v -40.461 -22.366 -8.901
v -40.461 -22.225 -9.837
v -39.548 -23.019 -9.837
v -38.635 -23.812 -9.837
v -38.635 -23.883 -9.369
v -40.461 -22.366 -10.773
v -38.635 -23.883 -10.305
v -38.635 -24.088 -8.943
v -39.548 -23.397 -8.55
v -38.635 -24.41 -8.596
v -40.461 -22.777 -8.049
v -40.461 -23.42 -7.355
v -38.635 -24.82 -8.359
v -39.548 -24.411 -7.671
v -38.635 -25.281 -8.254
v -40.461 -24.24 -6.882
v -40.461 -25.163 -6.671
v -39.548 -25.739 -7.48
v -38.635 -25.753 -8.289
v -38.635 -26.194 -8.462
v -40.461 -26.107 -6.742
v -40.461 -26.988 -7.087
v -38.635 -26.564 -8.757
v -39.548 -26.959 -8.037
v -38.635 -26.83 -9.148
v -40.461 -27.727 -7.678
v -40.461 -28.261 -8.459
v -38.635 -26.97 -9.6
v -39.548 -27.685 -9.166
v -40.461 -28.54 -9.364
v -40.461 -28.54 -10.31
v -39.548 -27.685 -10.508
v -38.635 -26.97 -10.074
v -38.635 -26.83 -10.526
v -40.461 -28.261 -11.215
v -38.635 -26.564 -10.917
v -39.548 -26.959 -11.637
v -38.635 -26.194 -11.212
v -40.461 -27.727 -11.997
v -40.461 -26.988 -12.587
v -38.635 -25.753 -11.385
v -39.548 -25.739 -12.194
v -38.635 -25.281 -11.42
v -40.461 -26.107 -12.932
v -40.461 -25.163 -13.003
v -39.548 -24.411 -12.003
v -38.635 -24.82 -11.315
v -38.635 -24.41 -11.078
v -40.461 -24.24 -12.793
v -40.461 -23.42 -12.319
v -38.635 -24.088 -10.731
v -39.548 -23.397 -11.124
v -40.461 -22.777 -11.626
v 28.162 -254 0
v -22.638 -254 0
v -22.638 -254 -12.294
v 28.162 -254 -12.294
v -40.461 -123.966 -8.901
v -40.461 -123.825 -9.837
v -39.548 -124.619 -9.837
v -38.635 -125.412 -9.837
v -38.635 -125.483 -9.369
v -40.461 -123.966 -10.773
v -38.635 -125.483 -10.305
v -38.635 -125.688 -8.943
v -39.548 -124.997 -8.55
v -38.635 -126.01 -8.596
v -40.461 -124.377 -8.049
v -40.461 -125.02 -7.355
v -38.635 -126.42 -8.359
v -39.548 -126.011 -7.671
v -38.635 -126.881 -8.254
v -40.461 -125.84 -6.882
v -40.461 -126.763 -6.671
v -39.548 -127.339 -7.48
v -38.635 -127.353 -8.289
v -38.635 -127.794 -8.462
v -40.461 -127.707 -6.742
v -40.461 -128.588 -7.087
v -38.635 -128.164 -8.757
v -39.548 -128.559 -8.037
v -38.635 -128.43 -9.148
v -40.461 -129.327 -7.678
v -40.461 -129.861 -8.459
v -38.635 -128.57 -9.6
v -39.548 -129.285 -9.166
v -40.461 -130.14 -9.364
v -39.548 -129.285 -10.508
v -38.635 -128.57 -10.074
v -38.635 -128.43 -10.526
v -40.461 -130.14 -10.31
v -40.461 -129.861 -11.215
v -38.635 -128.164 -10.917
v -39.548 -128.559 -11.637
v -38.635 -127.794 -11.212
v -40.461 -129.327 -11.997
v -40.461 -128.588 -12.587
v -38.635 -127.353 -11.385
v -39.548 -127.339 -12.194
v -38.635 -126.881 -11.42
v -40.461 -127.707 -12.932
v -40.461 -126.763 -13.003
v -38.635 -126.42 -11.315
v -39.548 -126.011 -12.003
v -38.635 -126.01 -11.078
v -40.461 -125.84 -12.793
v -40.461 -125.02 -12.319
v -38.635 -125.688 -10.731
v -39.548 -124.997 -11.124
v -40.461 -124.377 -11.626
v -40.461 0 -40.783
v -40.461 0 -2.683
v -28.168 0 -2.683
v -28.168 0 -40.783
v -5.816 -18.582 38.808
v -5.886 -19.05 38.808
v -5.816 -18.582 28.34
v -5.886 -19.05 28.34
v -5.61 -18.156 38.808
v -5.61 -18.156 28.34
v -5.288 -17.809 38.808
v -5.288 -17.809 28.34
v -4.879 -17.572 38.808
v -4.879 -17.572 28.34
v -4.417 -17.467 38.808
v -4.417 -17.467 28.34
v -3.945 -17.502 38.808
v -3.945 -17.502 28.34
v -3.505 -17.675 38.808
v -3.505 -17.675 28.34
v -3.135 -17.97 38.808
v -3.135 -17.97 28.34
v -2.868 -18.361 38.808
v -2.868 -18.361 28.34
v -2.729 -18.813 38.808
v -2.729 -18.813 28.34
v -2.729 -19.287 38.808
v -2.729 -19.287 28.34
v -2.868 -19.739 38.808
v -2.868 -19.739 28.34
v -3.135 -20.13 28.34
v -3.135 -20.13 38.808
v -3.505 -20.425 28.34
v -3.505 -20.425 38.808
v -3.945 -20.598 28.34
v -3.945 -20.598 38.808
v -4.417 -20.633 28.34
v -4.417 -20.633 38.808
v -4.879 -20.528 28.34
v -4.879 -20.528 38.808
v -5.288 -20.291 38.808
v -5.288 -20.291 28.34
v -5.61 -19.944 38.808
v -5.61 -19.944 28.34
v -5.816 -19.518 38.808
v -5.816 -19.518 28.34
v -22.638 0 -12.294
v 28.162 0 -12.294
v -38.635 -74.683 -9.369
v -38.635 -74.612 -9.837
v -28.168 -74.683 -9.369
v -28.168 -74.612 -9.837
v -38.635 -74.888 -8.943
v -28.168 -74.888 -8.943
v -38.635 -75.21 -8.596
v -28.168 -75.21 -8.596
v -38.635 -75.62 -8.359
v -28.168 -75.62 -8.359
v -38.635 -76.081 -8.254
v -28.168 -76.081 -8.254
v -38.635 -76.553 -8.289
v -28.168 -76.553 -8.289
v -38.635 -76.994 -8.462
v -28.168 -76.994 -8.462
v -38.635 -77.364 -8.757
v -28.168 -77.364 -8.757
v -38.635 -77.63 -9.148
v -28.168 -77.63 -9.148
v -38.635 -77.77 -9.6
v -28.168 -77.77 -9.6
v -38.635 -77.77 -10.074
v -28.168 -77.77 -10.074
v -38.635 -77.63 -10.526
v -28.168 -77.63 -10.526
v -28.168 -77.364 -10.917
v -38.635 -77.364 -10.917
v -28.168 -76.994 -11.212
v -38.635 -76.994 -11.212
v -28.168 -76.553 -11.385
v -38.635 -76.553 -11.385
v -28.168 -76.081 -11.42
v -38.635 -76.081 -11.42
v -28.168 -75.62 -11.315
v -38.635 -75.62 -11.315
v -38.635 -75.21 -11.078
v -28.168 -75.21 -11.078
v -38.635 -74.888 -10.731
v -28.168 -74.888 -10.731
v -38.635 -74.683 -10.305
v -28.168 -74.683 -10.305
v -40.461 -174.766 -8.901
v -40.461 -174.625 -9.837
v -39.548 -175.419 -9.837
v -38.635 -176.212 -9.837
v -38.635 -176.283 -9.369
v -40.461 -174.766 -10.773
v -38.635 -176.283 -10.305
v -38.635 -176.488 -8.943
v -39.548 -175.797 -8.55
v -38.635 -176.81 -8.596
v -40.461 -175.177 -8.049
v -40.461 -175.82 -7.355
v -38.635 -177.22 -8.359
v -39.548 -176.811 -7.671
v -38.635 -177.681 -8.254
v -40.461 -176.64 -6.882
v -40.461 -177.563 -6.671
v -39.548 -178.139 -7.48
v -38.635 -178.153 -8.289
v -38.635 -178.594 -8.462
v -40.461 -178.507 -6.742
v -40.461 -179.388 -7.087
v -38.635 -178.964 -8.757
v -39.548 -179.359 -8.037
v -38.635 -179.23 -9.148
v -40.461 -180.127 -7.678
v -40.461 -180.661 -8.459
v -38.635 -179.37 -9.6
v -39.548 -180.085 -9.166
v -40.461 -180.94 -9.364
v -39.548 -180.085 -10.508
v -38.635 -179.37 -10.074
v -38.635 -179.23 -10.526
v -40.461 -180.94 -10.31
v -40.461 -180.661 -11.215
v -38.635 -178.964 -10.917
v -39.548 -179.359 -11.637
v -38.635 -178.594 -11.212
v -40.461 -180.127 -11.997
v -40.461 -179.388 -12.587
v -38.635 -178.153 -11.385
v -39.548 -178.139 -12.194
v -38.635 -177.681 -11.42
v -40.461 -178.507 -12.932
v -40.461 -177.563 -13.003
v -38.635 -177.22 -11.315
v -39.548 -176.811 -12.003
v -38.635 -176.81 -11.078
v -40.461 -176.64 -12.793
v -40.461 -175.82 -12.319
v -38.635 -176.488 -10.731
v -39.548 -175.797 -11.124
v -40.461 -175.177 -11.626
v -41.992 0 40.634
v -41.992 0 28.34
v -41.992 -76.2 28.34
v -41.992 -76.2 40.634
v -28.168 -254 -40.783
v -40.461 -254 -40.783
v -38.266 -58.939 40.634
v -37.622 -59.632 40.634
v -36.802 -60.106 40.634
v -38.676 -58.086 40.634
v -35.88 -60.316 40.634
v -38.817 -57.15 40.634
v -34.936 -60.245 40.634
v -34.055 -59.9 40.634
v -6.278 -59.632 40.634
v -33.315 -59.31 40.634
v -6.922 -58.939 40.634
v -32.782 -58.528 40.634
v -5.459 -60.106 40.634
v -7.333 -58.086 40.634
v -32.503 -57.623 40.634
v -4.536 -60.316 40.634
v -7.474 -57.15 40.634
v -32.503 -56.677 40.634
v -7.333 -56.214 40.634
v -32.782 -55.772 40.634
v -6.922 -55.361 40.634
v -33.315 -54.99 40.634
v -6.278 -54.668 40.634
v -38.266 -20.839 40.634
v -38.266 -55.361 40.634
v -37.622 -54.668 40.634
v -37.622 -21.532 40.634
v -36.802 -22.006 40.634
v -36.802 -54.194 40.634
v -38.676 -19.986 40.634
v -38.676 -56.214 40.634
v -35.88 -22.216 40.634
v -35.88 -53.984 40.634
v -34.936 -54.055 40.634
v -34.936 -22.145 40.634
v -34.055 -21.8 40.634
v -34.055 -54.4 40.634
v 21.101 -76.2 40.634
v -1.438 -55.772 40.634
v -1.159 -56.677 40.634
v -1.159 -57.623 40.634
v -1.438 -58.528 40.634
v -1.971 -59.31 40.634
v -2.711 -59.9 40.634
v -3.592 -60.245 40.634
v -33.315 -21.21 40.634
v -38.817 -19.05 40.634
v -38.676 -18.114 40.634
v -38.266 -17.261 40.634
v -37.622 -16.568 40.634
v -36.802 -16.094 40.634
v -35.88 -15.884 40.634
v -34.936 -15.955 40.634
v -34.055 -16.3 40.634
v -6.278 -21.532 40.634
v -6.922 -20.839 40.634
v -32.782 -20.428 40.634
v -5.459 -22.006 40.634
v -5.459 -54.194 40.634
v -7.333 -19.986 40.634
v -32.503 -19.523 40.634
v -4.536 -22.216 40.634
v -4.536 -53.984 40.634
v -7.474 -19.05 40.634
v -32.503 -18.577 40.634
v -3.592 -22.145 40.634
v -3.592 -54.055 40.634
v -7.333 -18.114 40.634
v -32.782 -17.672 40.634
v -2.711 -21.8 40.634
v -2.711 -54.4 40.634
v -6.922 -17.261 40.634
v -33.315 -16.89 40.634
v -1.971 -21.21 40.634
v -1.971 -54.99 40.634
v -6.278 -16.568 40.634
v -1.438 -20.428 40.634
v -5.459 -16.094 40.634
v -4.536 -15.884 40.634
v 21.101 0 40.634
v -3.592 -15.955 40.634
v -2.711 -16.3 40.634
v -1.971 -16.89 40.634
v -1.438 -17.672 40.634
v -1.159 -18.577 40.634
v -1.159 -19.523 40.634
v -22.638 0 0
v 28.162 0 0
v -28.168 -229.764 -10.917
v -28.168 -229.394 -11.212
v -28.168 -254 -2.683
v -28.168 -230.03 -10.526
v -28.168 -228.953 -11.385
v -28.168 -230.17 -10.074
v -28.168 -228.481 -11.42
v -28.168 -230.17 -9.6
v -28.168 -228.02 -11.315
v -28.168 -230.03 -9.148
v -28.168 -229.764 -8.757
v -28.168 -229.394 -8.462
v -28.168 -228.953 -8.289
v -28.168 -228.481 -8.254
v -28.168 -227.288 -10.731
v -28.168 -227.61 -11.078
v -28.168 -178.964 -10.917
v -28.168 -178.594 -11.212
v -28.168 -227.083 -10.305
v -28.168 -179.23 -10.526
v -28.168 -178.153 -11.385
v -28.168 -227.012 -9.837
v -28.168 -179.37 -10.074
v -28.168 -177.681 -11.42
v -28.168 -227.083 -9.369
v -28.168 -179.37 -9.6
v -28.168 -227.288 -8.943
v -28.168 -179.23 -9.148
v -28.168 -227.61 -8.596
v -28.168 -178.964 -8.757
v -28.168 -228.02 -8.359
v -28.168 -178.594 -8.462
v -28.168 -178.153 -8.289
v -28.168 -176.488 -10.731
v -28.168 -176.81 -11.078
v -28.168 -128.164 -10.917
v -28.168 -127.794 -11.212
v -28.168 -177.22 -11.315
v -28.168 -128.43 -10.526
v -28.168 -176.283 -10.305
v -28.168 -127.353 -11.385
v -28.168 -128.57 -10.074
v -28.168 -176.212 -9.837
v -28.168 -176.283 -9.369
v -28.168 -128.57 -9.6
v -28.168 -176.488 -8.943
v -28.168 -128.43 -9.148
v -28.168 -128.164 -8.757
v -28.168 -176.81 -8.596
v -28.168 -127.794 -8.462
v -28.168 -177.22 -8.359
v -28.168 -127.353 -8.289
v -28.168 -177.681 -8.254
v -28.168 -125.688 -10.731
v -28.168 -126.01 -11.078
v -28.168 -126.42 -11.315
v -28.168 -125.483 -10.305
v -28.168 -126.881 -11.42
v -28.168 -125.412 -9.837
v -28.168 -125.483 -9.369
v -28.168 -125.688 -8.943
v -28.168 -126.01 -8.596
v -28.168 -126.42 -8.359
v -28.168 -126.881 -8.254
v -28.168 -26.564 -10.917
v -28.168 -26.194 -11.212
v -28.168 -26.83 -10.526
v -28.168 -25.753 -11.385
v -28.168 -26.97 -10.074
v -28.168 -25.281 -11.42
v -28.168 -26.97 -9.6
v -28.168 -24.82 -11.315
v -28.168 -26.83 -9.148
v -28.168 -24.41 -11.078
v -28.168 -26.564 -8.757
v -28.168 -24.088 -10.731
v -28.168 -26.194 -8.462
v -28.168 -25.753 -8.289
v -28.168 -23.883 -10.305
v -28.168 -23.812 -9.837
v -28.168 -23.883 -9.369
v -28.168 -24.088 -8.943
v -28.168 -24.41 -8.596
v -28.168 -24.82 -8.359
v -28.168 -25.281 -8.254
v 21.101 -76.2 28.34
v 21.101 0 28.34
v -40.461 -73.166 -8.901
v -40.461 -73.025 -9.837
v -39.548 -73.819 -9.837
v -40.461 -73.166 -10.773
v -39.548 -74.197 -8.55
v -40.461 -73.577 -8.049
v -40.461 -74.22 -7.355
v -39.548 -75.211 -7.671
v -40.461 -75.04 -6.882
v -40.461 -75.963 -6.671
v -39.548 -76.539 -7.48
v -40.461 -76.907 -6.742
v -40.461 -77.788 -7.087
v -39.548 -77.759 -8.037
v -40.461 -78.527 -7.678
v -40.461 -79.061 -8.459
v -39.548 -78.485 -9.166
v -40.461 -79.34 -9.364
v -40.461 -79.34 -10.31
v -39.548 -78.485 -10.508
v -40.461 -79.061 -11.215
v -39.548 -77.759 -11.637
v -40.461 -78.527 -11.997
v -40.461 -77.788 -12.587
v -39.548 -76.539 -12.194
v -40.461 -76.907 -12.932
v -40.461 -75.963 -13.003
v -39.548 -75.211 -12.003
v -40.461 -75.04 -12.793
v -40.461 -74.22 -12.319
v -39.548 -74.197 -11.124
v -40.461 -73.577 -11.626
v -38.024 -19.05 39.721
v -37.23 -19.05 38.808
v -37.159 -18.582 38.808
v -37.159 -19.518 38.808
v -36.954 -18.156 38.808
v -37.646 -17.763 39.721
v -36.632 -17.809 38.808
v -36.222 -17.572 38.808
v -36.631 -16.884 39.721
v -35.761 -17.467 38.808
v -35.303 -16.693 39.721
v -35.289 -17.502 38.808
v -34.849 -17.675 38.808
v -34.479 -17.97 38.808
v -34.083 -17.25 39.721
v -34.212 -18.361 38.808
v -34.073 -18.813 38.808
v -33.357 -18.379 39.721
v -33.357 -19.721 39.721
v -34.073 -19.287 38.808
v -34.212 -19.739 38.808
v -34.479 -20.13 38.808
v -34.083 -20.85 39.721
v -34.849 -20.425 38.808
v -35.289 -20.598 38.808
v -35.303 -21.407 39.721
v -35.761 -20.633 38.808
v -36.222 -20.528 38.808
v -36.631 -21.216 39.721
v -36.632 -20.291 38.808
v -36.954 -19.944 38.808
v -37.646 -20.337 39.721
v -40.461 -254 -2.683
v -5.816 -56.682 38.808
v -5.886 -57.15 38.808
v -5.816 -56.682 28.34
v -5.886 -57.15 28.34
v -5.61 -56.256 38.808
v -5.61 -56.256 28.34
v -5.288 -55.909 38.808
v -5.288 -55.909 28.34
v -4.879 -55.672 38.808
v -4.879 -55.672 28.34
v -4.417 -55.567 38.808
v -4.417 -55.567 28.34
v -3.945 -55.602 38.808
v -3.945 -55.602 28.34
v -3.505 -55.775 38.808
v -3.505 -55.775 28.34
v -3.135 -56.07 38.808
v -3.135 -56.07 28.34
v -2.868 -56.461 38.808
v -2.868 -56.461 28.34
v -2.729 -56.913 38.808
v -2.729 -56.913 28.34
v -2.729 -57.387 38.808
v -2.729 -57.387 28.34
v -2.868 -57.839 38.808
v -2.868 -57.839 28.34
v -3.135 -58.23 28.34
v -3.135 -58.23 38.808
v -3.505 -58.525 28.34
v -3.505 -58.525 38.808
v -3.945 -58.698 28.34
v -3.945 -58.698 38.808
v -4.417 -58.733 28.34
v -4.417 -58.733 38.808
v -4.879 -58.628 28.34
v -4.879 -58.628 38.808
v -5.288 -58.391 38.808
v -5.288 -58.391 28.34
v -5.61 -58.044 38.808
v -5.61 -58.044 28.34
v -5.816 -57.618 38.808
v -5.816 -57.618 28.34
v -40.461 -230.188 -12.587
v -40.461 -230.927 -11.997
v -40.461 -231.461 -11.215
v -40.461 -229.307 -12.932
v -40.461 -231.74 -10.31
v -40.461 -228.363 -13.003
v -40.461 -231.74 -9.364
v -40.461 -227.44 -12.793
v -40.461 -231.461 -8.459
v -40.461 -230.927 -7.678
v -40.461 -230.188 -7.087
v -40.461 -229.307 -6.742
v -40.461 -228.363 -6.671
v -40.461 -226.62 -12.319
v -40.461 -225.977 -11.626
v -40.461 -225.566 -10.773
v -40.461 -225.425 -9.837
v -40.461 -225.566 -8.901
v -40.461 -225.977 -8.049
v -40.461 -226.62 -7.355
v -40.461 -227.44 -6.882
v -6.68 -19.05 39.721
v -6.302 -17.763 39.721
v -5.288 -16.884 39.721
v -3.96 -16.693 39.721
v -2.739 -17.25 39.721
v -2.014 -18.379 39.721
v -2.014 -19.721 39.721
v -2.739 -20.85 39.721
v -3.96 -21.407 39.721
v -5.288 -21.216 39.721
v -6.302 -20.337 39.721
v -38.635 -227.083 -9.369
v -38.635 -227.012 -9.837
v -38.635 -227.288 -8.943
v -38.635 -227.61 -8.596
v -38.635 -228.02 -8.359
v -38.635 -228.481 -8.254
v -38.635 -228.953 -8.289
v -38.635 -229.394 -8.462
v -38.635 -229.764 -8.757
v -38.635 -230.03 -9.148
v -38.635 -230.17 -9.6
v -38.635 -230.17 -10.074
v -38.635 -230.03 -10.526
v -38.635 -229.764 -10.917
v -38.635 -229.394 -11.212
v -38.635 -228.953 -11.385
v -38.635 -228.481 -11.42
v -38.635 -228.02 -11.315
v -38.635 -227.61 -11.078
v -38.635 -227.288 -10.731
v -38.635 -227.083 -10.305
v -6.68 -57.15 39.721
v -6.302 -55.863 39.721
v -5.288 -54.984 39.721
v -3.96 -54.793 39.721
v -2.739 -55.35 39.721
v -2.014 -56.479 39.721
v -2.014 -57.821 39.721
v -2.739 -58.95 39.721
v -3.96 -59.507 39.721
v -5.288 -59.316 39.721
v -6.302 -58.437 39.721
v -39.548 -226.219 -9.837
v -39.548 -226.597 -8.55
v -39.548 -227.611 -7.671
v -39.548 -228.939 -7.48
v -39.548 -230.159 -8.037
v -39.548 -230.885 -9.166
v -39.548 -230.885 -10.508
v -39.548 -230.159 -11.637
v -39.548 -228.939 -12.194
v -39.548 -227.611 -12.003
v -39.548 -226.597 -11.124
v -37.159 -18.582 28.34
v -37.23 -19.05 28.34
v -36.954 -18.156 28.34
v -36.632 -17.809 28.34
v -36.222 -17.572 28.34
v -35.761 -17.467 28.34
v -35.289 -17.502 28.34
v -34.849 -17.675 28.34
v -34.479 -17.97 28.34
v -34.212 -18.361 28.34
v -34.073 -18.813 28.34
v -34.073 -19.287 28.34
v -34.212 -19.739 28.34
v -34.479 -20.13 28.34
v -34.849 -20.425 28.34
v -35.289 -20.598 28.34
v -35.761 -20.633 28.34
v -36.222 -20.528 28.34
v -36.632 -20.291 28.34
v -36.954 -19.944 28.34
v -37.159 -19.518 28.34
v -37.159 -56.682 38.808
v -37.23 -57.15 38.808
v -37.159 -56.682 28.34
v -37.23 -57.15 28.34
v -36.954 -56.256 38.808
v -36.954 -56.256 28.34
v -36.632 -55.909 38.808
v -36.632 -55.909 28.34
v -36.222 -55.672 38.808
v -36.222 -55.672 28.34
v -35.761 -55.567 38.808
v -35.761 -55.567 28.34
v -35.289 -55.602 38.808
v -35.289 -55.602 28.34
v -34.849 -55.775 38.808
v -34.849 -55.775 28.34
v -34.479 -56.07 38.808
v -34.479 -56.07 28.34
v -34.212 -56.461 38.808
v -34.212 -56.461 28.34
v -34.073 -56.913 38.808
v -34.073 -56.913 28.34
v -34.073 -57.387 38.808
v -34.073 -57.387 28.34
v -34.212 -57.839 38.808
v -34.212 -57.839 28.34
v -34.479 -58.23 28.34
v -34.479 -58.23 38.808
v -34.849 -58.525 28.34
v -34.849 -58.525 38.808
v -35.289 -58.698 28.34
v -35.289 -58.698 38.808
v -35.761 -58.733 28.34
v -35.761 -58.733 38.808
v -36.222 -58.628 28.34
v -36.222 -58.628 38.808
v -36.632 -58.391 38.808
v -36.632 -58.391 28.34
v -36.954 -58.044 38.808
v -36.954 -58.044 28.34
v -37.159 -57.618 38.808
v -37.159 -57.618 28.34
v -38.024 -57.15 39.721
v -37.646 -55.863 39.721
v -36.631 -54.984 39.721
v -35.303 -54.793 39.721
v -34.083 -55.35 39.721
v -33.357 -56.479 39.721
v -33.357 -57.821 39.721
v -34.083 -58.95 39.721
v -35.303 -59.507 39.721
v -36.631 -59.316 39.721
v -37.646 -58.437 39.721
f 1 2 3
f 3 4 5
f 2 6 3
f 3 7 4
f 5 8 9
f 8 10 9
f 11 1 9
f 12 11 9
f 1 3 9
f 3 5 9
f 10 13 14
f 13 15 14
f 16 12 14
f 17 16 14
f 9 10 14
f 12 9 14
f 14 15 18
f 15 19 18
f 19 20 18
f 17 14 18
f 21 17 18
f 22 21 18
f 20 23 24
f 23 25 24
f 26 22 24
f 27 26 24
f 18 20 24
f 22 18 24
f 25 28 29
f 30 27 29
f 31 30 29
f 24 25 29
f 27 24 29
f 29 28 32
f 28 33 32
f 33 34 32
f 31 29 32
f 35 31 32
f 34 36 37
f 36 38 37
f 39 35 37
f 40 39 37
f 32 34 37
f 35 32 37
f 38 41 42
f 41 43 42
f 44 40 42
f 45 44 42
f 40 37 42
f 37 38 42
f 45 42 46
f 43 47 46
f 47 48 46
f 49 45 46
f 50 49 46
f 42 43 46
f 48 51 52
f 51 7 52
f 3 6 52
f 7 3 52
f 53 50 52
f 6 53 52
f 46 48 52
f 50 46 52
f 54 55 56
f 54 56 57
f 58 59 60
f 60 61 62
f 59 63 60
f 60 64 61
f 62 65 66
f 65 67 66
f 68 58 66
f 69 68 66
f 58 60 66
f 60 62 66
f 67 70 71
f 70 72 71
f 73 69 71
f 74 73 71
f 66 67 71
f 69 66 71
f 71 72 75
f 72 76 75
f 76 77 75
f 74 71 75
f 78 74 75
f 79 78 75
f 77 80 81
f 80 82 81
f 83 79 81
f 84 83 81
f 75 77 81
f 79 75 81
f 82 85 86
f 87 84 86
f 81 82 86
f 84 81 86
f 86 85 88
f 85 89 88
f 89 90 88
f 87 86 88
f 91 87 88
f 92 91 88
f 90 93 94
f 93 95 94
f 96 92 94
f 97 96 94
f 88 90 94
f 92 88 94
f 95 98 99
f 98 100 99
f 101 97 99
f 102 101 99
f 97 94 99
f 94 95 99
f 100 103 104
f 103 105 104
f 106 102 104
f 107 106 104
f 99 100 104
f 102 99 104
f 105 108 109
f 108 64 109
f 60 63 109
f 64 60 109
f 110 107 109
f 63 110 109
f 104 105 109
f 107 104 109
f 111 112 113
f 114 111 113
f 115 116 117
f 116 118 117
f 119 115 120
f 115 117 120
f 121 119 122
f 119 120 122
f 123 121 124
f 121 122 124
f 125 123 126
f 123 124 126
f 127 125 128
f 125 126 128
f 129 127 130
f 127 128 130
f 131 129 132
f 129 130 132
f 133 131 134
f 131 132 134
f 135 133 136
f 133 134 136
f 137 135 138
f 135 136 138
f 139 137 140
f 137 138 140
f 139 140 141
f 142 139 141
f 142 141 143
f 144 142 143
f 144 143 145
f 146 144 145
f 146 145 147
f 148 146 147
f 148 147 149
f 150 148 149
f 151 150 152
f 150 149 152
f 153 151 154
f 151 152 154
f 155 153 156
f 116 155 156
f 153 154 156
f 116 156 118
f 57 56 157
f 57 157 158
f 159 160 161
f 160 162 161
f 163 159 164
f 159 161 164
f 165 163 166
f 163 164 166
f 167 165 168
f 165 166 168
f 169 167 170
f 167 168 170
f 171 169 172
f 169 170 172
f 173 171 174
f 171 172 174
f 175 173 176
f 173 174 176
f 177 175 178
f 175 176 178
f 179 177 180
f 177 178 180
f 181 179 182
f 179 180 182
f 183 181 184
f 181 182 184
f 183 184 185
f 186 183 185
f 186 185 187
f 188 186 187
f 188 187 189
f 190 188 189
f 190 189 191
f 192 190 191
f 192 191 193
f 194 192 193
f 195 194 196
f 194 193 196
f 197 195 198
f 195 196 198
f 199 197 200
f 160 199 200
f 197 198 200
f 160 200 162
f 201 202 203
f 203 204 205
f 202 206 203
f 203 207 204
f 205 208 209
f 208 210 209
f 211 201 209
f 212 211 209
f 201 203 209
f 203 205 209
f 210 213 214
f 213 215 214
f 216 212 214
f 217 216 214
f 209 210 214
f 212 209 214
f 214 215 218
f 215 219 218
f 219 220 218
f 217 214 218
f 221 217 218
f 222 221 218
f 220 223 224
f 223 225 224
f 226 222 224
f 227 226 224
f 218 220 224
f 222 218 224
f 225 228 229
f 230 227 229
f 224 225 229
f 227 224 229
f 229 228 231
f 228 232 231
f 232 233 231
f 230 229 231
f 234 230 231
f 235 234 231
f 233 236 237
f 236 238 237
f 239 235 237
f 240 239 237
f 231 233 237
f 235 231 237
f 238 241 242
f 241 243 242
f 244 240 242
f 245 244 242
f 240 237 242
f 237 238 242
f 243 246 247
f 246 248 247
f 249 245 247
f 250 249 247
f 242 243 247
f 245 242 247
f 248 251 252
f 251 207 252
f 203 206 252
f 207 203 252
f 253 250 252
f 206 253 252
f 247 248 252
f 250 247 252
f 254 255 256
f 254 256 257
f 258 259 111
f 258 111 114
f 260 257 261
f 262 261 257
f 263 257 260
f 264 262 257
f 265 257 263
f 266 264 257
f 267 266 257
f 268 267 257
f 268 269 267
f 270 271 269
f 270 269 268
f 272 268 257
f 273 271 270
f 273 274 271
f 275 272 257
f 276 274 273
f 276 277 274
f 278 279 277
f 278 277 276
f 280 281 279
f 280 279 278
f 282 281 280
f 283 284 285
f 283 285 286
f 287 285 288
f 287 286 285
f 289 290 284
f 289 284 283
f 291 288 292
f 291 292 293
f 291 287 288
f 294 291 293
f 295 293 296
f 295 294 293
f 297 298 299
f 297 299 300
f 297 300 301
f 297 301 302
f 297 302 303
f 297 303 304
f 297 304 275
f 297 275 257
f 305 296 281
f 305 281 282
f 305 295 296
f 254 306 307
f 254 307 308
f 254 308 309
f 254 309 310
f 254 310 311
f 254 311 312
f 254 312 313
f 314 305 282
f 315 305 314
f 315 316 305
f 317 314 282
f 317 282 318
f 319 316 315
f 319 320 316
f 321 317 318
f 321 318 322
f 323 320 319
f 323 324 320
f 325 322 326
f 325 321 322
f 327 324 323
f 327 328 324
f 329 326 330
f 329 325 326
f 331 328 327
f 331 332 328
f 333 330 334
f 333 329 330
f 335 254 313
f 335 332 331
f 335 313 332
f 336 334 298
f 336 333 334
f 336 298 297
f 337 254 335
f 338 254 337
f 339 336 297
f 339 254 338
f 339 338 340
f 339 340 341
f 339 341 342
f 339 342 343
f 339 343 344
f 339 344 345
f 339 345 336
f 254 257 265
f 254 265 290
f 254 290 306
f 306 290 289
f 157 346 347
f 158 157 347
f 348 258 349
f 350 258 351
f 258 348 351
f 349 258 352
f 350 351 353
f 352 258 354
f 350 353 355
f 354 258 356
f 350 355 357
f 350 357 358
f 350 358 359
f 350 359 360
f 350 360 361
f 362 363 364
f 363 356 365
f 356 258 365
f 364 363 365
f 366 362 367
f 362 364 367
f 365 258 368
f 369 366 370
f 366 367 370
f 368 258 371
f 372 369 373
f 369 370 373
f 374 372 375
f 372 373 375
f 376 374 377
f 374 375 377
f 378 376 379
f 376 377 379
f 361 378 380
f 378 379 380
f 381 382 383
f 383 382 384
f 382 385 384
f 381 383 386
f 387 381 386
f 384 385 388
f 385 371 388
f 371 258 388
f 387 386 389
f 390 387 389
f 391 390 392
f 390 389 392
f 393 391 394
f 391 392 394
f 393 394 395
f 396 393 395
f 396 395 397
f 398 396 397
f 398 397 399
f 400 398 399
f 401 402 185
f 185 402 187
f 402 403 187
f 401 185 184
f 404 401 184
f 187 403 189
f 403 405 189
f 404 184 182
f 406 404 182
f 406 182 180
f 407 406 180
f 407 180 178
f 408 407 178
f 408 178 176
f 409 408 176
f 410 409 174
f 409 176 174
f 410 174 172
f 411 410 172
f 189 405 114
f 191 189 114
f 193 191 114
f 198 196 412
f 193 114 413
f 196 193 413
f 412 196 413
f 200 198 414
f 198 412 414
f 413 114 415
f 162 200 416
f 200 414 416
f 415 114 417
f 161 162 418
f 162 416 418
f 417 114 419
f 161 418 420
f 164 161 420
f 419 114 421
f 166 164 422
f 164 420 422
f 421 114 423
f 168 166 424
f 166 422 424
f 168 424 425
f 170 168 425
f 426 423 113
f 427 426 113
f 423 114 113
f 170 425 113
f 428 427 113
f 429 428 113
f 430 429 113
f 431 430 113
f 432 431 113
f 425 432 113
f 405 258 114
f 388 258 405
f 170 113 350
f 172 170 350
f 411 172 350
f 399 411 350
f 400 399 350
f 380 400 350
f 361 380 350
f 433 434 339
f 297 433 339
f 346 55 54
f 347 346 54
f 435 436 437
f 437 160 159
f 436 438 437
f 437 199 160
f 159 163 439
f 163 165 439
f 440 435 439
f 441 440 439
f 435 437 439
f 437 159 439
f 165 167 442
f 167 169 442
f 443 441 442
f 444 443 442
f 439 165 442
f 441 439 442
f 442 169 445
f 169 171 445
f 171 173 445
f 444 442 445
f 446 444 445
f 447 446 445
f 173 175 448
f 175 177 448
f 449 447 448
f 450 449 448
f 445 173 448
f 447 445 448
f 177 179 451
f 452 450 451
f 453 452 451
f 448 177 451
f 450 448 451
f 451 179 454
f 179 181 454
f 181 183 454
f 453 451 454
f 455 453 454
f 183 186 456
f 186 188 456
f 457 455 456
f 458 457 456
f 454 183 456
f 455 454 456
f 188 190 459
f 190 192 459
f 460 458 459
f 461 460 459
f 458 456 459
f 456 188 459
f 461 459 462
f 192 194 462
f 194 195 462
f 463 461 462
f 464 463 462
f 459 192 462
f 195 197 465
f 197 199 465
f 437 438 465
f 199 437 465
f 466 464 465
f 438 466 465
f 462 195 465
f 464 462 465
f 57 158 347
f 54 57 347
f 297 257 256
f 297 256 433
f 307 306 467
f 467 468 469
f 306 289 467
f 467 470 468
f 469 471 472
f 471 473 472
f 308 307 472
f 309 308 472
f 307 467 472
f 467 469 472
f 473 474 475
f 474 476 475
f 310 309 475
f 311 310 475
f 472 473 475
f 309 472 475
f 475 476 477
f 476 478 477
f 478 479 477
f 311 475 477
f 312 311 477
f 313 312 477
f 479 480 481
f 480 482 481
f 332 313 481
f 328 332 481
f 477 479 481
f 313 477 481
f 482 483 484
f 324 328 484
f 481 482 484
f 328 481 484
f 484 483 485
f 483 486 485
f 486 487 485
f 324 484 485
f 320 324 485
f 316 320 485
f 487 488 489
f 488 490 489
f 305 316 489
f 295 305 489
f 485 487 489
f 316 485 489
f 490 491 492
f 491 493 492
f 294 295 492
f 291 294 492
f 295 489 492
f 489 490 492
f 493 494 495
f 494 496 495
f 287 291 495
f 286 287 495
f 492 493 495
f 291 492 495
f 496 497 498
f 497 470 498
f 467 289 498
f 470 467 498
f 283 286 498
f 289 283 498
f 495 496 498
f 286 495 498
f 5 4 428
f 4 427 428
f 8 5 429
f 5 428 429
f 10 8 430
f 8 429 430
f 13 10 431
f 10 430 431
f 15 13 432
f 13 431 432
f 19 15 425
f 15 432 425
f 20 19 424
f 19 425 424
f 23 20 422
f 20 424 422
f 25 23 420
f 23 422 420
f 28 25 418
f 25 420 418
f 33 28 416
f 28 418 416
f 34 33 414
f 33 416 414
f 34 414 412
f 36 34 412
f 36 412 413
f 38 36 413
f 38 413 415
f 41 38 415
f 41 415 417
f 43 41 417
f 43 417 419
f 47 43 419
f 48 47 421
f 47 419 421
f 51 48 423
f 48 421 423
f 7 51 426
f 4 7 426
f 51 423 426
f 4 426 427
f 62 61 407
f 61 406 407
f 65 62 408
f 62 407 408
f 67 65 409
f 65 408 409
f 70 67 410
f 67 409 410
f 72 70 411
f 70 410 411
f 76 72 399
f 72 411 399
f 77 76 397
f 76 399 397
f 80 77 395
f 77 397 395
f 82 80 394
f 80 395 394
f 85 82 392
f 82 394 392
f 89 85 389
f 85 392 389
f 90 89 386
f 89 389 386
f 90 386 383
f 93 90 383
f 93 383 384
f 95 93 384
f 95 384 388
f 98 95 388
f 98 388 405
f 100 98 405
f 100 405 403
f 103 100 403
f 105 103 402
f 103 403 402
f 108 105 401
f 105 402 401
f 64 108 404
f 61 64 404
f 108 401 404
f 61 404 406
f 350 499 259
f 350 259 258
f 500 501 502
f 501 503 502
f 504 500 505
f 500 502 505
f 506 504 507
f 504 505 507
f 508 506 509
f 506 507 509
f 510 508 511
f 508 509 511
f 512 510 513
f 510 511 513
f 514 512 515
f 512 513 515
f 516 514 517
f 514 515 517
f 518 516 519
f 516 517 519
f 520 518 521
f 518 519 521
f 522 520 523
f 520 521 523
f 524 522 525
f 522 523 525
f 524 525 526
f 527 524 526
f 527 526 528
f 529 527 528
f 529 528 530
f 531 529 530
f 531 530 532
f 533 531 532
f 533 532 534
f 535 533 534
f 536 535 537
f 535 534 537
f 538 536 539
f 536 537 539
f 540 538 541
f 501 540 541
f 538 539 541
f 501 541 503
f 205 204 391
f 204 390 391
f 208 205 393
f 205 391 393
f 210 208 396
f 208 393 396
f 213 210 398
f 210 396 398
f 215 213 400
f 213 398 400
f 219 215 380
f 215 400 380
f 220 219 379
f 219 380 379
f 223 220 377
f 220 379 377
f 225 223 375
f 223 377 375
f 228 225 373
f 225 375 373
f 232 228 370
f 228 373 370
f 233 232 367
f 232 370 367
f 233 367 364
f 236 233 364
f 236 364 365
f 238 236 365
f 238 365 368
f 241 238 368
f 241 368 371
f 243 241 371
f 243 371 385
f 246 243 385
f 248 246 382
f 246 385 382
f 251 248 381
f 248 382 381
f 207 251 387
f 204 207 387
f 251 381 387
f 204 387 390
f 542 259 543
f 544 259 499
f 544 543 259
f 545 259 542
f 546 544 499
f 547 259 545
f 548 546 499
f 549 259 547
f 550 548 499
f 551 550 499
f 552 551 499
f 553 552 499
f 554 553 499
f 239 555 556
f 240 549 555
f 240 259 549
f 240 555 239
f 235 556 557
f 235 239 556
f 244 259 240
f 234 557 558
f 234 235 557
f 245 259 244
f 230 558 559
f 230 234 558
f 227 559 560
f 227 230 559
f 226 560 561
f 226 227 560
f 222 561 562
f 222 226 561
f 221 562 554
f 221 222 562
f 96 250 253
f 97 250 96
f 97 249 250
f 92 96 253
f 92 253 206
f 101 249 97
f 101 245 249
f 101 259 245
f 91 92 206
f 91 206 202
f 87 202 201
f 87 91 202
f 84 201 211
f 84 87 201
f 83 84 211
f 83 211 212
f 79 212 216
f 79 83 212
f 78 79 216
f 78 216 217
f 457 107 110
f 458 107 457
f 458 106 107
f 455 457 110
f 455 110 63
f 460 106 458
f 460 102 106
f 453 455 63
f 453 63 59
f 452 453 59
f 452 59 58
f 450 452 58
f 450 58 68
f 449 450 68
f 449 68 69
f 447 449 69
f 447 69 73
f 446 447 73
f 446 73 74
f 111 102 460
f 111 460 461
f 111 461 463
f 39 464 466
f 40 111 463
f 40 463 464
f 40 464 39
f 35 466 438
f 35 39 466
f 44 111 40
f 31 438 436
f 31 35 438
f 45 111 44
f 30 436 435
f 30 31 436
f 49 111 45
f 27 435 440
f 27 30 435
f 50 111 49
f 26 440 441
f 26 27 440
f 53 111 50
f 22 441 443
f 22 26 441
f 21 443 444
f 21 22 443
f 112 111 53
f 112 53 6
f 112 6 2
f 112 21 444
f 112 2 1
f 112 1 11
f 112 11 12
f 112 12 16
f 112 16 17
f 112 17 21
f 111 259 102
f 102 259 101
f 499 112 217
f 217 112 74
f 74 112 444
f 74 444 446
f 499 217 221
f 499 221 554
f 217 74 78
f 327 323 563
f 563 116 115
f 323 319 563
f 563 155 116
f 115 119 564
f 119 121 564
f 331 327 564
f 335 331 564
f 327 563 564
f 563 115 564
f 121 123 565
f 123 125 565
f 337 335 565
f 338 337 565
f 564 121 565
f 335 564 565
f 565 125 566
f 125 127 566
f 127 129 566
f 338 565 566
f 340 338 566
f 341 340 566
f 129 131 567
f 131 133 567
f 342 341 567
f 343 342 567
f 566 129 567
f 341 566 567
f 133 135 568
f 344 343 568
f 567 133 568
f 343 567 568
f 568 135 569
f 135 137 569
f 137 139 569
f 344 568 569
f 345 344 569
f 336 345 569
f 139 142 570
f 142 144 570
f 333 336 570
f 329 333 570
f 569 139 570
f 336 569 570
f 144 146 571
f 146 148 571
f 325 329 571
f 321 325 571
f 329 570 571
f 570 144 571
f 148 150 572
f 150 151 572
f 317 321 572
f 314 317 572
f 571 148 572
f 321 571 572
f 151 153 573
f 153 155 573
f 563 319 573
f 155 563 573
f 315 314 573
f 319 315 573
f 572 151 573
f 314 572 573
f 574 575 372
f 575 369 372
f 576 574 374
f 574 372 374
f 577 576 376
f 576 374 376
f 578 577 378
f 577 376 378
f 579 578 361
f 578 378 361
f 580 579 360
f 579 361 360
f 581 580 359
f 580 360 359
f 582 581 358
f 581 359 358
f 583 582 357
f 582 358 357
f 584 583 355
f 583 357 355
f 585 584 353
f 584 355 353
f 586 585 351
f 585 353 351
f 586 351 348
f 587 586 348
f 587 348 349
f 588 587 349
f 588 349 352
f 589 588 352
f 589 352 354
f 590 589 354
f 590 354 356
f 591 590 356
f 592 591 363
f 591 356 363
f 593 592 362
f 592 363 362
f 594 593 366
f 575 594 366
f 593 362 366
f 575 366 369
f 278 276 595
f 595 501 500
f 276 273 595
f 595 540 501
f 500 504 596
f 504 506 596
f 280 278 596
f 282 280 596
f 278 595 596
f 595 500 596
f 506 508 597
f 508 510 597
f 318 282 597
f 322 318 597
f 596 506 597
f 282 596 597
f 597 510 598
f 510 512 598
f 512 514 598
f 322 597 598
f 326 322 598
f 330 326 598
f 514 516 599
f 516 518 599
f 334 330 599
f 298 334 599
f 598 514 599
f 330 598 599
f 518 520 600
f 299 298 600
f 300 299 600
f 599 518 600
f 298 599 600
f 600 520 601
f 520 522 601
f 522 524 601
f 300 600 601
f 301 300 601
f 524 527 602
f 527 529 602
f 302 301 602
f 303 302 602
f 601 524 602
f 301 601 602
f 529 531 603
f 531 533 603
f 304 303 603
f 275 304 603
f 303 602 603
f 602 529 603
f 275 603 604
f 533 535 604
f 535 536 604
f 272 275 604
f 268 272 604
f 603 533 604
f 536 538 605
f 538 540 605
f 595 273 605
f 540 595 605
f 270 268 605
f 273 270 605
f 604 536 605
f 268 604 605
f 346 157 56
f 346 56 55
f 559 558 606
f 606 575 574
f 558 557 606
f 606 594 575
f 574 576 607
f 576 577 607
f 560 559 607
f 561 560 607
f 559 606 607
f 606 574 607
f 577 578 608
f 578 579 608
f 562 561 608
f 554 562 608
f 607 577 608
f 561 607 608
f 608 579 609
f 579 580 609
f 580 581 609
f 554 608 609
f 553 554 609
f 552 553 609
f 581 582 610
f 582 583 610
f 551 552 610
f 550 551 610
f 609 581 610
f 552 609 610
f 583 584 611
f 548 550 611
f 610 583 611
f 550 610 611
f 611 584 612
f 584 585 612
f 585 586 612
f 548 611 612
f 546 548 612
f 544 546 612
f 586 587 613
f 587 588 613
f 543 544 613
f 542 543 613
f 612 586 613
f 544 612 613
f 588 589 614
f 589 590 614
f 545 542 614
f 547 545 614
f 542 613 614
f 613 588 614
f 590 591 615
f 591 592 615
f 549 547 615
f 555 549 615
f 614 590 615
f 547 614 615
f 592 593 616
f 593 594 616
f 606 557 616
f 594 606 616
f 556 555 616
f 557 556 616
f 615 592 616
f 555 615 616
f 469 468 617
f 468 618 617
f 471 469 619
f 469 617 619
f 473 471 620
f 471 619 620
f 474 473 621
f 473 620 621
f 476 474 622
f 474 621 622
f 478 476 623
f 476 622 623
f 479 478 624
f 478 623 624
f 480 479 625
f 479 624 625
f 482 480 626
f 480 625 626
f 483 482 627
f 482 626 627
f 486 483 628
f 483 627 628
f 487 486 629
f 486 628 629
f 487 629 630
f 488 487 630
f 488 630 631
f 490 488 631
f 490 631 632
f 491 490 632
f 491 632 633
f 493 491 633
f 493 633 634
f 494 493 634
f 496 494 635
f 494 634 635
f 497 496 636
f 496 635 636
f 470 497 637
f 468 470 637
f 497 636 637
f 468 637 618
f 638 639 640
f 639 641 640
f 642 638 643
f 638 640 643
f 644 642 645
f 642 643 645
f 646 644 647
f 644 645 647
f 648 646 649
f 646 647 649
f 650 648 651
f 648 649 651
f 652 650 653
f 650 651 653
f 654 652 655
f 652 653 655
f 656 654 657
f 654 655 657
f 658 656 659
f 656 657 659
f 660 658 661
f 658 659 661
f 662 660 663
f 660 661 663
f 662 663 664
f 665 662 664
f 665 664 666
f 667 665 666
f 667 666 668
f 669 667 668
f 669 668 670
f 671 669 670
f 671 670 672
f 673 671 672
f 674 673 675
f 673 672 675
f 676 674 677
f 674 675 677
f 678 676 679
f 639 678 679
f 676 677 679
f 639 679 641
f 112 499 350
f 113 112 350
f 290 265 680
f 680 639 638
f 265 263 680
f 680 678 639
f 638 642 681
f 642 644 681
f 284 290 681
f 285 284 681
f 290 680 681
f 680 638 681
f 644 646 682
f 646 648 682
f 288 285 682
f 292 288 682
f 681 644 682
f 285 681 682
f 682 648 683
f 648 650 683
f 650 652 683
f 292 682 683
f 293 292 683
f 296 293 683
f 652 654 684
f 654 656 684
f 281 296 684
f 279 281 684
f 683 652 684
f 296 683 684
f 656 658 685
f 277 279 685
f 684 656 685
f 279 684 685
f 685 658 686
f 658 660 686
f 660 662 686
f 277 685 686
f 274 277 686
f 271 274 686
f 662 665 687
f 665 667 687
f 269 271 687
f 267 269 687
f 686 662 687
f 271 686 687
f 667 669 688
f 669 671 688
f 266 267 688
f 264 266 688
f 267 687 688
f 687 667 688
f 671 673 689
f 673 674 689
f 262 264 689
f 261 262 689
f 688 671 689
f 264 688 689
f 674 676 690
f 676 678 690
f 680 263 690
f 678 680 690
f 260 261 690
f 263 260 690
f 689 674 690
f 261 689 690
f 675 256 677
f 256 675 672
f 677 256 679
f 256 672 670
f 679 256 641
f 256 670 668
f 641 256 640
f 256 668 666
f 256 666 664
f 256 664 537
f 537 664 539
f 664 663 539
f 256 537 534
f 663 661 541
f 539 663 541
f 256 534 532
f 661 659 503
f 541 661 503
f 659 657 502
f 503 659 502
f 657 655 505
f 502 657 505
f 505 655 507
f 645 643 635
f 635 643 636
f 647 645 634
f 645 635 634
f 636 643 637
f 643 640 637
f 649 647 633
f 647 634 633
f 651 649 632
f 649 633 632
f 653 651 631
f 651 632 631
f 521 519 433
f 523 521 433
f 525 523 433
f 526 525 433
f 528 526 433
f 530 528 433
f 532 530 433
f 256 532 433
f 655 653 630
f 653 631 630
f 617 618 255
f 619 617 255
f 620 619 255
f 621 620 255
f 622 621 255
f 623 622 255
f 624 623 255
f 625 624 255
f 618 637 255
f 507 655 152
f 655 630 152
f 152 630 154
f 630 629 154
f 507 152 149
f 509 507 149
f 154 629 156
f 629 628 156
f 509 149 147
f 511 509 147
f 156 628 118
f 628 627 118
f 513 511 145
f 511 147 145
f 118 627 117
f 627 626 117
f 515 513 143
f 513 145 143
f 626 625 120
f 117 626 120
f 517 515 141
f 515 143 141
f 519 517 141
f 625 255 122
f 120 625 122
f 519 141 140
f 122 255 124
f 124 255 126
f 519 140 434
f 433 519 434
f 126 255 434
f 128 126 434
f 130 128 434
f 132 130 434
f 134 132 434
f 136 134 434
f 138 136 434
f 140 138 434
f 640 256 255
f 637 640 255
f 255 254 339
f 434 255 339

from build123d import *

# Parameters (mm, degrees)
F0_W           = 12.2936
F0_H           = 38.1
F0_W_2         = 50.8
F0_H_2         = 12.2936
F1_DEPTH       = 254
F0_W_3         = 63.0936
F2_DEPTH       = 76.2
F4_D           = 3.175
F4_DEPTH       = 12.7
F4_CSINK_D     = 6.35
F4_CSINK_ANGLE = 82
F6_D           = 3.175
F6_DEPTH       = 12.7
F6_CSINK_D     = 6.35
F6_CSINK_ANGLE = 82


with BuildPart() as f1:
    # F0 (on Front) → F1 (new body)
    with BuildSketch(Plane.XZ):
        with Locations((-34.314467, -21.732634)):
            Rectangle(F0_W, F0_H)
        with Locations((2.762182, -6.1468)):
            Rectangle(F0_W_2, F0_H_2)
    extrude(amount=F1_DEPTH)

    # F4
    with Locations(Plane(origin=(-40.461267, 0, 0), x_dir=(0, -1, 0), z_dir=(-1, 0, 0))):
        with Locations((25.4, -9.837061), (76.2, -9.837061), (127, -9.837061), (177.8, -9.837061), (228.6, -9.837061)):
            CounterSinkHole(F4_D / 2, F4_CSINK_D / 2, depth=F4_DEPTH, counter_sink_angle=F4_CSINK_ANGLE)


with BuildPart() as f2:
    # F0 (on Front) → F2 (new body)
    with BuildSketch(Plane.XZ):
        with Locations((-10.445492, 34.487276)):
            Rectangle(F0_W_3, F0_H_2)
    extrude(amount=F2_DEPTH)

    # F6
    with Locations(Plane.XY.offset(40.634076)):
        with Locations((-4.298692, -19.05), (-4.298692, -57.15), (-35.642292, -19.05), (-35.642292, -57.15)):
            CounterSinkHole(F6_D / 2, F6_CSINK_D / 2, depth=F6_DEPTH, counter_sink_angle=F6_CSINK_ANGLE)


solid = Compound([f1.part, f2.part])
